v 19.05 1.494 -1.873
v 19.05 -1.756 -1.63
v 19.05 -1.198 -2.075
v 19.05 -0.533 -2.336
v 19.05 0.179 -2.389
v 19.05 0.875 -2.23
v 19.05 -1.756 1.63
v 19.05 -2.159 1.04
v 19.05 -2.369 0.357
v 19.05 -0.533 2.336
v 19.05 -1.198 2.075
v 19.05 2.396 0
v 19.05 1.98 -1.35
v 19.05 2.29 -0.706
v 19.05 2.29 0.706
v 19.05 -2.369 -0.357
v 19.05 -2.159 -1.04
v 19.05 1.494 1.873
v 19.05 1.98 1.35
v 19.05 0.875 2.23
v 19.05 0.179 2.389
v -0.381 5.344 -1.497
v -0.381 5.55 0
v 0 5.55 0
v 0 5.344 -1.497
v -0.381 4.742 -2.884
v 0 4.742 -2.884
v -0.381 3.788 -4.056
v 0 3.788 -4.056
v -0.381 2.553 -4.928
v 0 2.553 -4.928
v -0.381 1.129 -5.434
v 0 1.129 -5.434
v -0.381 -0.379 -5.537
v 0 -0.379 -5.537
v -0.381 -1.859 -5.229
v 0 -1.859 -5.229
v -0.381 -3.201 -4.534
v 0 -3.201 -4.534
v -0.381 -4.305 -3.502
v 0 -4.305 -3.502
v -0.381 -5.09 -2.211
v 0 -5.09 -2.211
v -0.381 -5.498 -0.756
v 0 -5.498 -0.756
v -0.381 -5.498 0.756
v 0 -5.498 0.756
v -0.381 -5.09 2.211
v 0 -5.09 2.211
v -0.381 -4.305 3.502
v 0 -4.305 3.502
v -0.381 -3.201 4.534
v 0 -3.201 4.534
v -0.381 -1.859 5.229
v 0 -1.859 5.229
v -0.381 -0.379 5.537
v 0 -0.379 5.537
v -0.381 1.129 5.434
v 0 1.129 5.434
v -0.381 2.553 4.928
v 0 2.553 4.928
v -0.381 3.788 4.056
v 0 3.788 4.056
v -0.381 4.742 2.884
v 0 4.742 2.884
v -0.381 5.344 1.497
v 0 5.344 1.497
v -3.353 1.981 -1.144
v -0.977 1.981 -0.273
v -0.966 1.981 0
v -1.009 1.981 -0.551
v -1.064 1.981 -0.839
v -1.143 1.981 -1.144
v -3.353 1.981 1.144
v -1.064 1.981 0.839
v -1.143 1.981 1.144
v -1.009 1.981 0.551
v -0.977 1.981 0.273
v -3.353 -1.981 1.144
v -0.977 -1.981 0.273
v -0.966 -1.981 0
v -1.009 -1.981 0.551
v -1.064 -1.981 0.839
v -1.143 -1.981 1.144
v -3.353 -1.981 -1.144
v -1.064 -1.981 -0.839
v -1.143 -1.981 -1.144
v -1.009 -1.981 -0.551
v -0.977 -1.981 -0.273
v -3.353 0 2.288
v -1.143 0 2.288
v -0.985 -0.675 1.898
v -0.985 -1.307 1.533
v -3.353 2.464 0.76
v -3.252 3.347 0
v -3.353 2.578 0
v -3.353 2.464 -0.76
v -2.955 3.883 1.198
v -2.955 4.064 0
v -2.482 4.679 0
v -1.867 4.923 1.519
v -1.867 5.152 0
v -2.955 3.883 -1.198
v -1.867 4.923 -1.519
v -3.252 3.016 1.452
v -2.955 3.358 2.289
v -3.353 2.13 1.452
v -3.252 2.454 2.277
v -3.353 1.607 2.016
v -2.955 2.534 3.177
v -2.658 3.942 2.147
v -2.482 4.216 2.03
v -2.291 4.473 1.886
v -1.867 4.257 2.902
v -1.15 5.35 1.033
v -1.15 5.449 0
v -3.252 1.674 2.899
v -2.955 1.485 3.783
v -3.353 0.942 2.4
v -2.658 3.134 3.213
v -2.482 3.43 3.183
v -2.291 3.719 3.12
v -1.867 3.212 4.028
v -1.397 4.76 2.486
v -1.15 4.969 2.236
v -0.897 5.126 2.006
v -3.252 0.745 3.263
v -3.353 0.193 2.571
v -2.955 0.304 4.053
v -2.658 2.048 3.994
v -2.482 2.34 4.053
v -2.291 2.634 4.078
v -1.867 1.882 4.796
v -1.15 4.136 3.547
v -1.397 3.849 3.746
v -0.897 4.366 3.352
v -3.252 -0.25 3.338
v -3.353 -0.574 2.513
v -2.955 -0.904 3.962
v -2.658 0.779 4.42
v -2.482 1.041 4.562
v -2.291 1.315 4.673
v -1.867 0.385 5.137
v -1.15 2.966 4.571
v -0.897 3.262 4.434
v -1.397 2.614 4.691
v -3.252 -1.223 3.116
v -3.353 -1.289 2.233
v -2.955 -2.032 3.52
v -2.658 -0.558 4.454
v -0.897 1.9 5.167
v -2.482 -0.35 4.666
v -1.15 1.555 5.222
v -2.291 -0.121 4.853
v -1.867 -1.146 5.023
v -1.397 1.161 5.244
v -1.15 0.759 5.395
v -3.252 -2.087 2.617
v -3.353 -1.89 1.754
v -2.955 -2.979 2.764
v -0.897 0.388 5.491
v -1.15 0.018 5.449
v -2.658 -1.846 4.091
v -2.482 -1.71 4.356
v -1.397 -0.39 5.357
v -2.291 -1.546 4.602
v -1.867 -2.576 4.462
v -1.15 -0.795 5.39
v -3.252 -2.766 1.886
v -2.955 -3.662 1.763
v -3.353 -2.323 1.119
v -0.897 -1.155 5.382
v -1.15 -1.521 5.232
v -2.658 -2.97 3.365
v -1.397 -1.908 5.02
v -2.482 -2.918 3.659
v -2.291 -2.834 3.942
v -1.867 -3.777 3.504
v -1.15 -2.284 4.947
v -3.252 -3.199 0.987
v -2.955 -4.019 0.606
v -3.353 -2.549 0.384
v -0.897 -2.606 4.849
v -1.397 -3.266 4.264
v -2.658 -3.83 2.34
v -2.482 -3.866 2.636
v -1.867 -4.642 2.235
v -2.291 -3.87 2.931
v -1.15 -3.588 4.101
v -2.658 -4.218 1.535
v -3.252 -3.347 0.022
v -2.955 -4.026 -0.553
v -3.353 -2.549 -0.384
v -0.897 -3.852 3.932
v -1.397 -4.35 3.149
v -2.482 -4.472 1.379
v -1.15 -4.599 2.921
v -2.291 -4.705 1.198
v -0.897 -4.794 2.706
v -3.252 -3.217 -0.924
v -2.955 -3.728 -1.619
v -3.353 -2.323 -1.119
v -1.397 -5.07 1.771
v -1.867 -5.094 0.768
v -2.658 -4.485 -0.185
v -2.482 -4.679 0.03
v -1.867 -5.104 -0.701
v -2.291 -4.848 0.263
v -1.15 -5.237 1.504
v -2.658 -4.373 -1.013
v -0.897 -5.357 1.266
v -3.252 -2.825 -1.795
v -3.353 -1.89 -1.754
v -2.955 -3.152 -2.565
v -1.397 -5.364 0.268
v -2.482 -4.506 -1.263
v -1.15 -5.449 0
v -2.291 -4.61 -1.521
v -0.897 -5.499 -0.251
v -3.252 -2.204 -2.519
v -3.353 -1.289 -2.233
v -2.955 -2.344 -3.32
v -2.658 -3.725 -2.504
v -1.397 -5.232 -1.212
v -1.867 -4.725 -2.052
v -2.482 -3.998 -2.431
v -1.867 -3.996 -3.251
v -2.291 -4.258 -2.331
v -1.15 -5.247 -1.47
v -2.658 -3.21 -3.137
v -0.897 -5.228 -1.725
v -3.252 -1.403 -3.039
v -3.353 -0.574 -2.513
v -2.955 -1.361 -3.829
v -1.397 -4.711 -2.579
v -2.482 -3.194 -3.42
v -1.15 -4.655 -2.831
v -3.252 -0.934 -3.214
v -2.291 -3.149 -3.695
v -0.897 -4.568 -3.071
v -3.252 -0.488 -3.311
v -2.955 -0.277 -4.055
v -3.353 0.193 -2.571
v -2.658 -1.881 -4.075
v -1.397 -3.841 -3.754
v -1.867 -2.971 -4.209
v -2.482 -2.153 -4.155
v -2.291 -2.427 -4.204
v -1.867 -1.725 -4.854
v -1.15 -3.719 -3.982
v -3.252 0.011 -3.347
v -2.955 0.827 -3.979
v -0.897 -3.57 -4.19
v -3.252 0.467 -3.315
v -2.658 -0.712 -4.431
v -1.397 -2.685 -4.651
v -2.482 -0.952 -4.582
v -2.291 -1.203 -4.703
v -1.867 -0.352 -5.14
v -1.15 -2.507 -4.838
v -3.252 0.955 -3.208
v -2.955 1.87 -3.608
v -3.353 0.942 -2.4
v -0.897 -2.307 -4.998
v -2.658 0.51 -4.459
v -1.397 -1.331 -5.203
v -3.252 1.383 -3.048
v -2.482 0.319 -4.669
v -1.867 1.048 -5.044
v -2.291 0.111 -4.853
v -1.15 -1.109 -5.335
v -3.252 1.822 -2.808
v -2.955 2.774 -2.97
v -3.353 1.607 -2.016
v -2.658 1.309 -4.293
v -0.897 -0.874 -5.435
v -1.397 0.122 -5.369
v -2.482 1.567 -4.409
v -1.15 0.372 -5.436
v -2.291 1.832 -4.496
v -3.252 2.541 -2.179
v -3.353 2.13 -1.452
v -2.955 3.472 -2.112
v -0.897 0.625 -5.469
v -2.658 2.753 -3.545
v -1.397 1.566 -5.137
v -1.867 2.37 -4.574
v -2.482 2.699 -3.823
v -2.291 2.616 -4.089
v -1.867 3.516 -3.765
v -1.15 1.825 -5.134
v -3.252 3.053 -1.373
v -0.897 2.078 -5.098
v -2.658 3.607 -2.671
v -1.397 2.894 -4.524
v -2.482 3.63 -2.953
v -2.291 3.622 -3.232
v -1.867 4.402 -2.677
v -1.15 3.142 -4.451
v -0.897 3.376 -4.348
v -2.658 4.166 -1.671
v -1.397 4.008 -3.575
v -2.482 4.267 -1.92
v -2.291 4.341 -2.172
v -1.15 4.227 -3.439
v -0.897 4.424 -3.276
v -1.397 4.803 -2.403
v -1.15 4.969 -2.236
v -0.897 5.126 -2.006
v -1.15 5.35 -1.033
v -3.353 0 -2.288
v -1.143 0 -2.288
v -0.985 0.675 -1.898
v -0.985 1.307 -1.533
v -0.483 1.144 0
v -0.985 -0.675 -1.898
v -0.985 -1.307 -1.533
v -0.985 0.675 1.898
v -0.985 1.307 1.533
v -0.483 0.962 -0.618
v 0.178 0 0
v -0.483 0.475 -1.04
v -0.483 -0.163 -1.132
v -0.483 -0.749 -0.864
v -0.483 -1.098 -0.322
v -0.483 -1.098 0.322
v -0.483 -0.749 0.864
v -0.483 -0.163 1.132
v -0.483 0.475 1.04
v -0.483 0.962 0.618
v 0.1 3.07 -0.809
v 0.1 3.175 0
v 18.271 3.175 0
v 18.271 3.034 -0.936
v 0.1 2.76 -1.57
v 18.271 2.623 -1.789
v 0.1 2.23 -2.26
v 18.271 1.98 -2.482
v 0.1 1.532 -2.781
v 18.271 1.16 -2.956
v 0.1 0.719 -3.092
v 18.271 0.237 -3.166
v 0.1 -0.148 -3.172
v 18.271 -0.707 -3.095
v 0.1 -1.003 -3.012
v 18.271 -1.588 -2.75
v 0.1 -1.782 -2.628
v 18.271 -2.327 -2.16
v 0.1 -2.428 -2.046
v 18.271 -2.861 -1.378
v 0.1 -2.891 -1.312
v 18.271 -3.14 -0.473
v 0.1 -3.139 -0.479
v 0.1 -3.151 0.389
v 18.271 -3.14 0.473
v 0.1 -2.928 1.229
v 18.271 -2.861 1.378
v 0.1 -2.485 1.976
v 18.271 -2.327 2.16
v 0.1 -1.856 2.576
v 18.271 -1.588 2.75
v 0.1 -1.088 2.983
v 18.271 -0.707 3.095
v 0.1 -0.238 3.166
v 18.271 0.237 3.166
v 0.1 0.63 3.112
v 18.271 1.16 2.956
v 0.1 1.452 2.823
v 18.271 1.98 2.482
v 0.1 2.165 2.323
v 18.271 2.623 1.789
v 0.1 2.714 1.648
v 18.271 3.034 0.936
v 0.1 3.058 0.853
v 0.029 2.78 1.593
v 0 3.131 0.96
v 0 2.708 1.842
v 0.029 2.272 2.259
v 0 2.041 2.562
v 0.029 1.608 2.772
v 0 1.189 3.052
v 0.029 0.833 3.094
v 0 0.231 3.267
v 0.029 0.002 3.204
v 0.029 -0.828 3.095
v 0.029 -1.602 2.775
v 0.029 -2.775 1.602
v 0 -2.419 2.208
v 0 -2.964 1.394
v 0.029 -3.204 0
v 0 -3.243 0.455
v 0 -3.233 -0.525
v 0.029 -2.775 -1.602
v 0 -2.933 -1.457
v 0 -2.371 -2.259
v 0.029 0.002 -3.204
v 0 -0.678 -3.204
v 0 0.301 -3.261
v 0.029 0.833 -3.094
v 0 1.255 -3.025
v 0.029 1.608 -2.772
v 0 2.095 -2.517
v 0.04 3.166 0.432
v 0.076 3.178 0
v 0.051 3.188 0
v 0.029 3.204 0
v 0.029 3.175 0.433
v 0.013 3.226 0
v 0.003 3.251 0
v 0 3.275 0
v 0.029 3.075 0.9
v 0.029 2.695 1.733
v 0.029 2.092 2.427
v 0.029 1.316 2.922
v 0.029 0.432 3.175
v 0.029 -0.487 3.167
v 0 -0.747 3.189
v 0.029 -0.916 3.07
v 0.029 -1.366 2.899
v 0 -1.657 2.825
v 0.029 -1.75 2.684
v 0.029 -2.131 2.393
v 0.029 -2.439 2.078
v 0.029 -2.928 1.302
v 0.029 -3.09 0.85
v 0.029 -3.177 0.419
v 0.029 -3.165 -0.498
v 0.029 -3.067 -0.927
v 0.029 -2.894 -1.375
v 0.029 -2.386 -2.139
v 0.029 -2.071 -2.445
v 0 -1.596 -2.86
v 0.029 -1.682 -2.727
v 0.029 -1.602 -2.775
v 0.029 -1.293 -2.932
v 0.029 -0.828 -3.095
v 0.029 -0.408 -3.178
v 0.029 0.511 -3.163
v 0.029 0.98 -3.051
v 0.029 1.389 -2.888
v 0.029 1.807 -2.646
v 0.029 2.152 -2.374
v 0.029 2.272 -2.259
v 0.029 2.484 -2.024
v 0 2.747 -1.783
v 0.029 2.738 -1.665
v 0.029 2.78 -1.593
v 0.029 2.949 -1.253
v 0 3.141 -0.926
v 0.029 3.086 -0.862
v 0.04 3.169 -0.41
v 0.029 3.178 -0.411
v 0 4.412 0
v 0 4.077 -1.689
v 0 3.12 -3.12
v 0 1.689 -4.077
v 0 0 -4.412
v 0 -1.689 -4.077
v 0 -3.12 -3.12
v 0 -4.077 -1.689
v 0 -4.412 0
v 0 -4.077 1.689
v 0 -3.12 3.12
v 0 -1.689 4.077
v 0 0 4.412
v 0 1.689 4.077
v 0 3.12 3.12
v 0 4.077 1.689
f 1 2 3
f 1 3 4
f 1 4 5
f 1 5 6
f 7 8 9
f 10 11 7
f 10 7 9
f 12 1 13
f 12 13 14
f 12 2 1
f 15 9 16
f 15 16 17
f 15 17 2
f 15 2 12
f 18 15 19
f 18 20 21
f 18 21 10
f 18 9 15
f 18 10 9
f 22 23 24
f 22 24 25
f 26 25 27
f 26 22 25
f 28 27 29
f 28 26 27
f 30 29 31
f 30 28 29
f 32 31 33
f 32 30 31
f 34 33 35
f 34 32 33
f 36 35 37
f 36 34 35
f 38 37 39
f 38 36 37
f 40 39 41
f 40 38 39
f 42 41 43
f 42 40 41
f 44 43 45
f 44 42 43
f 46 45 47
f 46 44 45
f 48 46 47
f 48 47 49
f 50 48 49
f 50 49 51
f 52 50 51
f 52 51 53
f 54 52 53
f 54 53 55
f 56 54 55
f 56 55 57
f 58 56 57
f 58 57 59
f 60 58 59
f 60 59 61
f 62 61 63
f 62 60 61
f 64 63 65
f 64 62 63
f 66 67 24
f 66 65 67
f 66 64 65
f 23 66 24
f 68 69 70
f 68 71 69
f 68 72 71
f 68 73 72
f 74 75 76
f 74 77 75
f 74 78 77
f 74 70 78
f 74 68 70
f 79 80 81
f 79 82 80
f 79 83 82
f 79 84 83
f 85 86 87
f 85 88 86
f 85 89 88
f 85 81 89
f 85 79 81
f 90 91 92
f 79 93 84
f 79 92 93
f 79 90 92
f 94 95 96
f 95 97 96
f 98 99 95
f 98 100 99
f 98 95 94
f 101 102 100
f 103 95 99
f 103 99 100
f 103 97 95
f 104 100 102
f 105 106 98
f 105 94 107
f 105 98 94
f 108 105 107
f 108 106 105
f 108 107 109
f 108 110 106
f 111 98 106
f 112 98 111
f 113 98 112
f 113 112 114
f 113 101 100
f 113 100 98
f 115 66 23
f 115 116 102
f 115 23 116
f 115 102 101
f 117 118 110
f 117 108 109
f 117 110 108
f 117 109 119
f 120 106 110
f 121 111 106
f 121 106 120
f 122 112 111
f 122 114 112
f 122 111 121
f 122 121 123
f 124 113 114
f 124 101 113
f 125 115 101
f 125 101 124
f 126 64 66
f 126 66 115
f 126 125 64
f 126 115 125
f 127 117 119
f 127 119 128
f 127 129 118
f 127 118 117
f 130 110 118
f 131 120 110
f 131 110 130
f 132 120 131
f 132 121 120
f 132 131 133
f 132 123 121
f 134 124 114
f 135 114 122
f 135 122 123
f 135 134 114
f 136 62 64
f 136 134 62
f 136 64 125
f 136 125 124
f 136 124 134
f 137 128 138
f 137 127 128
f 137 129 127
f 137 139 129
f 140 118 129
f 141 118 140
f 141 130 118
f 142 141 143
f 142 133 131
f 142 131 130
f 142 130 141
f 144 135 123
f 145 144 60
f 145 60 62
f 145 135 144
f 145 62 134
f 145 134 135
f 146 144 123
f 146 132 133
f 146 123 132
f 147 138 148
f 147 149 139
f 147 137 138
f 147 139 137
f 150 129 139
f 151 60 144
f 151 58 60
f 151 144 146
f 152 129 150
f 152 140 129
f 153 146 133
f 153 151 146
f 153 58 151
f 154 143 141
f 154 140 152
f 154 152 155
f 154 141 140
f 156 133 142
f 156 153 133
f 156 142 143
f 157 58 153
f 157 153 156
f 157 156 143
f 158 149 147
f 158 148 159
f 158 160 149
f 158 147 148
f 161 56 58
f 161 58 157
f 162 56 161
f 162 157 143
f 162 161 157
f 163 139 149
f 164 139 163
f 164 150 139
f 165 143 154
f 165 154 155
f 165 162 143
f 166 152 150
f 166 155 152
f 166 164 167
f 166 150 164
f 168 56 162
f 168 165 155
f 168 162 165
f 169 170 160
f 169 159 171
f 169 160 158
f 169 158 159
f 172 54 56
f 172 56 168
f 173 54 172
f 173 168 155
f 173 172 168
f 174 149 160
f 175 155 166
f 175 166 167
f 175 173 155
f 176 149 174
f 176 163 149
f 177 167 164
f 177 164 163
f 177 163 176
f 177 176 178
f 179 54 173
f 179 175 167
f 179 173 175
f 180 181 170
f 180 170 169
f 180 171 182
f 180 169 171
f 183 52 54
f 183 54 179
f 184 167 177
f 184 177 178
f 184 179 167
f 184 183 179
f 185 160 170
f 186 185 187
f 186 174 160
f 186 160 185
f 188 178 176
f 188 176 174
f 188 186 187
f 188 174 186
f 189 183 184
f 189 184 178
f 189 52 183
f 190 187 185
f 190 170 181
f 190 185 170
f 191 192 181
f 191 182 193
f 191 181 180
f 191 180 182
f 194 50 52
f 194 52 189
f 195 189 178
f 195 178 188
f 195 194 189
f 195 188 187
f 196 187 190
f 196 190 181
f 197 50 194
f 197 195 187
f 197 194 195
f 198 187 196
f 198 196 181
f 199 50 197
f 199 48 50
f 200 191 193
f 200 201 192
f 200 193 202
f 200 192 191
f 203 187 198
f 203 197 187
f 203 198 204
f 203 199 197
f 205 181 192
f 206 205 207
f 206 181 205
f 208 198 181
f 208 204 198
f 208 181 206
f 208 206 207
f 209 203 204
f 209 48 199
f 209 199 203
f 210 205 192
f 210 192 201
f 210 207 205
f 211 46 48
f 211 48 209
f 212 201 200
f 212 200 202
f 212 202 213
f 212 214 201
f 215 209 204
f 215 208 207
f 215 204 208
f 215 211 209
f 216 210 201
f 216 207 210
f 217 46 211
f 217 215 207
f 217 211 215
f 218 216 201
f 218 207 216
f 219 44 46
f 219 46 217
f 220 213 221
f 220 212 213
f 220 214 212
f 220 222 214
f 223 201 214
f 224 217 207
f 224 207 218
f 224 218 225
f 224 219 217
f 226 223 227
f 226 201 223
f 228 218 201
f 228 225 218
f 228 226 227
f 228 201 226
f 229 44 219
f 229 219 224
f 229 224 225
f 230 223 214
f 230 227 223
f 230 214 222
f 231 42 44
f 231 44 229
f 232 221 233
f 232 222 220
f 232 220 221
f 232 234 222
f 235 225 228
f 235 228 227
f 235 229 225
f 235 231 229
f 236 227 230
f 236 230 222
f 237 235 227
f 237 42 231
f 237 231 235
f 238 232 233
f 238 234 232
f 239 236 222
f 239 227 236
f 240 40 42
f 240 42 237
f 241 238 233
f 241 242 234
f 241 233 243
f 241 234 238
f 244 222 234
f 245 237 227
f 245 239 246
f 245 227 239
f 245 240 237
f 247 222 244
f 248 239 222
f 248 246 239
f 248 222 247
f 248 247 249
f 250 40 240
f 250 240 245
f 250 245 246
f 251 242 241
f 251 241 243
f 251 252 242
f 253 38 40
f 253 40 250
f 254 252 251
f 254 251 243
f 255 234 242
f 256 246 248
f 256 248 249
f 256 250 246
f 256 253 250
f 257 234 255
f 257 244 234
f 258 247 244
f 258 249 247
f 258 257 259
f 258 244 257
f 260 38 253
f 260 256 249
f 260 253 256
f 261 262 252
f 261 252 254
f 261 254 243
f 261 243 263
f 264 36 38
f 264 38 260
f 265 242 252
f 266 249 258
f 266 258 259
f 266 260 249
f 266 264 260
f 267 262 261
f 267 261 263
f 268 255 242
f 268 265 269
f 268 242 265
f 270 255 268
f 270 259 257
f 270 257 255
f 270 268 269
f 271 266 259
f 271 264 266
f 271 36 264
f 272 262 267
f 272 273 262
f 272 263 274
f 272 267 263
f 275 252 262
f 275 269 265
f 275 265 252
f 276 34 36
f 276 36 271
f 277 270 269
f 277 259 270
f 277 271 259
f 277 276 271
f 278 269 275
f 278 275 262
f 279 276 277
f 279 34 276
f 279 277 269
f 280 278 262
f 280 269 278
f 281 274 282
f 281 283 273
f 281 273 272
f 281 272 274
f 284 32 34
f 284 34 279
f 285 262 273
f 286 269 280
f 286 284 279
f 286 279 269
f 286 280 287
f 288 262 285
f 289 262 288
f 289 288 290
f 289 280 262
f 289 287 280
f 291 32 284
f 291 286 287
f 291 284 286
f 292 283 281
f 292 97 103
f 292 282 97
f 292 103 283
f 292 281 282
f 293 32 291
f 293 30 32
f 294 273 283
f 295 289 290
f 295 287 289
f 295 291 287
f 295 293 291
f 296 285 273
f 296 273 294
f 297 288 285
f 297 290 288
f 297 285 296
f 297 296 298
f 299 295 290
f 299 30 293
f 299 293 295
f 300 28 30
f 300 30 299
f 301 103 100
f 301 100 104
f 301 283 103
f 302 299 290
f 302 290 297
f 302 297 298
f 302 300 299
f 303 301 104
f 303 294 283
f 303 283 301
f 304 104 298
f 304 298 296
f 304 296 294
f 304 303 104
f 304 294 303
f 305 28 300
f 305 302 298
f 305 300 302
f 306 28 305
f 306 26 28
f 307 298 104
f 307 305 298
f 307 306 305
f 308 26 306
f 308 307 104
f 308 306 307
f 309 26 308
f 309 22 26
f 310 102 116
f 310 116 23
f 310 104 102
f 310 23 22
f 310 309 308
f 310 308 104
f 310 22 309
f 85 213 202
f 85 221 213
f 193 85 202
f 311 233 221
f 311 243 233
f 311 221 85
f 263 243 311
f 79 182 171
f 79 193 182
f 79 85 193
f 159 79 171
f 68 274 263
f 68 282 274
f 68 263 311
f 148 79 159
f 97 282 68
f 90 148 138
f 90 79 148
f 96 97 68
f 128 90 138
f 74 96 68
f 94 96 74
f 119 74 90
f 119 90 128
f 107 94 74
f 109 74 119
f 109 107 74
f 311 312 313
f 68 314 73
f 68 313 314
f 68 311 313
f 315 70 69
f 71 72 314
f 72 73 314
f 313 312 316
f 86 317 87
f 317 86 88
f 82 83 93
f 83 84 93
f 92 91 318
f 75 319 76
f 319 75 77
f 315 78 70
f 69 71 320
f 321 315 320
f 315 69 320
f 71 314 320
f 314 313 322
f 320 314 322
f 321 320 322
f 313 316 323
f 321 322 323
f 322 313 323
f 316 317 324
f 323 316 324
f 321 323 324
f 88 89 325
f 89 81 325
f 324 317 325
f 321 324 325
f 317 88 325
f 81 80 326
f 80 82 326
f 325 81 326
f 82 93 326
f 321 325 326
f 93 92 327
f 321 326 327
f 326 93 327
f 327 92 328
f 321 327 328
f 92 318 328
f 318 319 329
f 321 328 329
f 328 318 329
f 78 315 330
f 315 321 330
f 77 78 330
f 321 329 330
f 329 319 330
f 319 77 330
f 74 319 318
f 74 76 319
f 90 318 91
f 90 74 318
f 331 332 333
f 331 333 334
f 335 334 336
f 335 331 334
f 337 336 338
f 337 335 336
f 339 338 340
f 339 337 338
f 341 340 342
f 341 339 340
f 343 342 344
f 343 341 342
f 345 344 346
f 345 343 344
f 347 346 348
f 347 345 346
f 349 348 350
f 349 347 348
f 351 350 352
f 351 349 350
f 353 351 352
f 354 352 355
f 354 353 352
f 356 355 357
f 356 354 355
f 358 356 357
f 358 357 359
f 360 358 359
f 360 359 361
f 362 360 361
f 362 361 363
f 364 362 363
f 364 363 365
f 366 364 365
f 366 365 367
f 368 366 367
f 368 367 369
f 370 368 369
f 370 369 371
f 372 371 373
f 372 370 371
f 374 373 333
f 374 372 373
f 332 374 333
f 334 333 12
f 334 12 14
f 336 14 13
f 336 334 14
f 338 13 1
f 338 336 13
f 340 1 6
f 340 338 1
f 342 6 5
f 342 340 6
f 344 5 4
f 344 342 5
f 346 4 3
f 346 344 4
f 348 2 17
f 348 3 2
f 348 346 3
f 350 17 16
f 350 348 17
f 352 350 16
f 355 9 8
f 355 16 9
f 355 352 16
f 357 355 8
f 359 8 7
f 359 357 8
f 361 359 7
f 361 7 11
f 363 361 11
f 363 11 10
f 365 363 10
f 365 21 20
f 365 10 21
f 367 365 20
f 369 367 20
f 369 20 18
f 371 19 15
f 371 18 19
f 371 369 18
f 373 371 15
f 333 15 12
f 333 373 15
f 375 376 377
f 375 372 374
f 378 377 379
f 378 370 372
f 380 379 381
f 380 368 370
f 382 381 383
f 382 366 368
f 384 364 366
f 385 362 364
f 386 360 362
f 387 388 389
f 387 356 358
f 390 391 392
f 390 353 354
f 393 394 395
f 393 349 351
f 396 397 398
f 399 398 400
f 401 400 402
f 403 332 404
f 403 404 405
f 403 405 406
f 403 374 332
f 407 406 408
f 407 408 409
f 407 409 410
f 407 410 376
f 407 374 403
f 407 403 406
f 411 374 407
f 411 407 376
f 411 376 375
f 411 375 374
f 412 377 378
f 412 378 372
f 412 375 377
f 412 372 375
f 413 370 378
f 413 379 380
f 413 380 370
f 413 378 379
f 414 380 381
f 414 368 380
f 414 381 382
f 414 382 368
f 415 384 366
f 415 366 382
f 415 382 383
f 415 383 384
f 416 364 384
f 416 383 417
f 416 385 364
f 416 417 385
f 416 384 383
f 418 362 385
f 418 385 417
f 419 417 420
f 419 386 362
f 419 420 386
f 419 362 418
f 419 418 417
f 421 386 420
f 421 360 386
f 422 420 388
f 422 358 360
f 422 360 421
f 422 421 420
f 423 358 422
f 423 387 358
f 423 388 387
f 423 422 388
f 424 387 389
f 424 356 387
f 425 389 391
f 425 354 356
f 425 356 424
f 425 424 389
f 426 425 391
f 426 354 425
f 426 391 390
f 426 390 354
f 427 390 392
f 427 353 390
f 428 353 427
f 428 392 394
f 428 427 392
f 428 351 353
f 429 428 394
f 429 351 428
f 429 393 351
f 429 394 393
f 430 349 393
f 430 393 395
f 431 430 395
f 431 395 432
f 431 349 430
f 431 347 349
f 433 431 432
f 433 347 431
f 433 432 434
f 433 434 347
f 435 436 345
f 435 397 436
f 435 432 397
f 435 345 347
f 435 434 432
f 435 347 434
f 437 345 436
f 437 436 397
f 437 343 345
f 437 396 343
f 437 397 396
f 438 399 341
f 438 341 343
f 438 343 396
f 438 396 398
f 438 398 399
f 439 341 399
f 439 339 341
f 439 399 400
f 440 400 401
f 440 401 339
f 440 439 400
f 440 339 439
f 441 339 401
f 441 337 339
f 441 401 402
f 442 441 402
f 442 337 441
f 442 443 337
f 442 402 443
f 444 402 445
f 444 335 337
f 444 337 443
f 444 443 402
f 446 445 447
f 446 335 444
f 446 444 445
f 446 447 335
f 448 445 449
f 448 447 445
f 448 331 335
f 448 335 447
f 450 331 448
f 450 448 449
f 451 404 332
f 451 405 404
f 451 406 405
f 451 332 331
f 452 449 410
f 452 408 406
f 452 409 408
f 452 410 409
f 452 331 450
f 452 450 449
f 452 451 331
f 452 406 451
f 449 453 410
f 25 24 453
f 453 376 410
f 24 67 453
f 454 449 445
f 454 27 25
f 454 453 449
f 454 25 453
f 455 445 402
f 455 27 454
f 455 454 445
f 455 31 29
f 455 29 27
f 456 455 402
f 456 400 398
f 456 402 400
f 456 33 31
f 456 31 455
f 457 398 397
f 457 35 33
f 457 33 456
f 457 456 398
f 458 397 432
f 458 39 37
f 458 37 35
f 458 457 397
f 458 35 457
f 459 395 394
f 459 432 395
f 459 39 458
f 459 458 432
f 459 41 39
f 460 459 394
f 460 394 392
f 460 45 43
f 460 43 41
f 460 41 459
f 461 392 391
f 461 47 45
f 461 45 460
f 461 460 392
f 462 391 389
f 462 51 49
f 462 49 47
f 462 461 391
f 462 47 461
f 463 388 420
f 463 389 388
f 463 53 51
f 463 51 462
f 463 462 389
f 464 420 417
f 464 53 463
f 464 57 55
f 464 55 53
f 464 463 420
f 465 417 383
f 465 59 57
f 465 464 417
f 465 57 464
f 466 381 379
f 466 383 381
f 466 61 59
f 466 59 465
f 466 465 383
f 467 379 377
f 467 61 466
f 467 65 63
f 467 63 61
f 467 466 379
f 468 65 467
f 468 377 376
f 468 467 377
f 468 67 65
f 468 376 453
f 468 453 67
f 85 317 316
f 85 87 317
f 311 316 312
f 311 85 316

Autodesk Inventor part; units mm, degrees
ref_plane "YZ Plane" through (0, 0, 0) normal (1, 0, 0) x (0, 1, 0)
ref_plane "XZ Plane" through (0, 0, 0) normal (0, 1, 0) x (-1, 0, 0)
sketch "Sketch1" plane through (0, 0, 0) normal (0, 0, 1) x (1, 0, 0)
  line L0 (0.1778, 0) -> (19.05, 0)
  line L1 (19.05, 0) -> (19.05, 3.175)
  line L2 (19.05, 3.175) -> (2.5402, 3.175)
  line L3 (2.5402, 3.175) -> (0.0001, 3.175)
  line L4 (0.0001, 3.175) -> (0, 3.175)
  line L5 (0, 3.175) -> (0, 5.5499)
  line L6 (0, 5.5499) -> (-3.3528, 5.5499)
  line L7 (-3.3528, 5.5499) -> (-3.3528, 2.2877)
  line L8 (-3.3528, 2.2877) -> (-1.143, 2.2877)
  line L9 (-1.143, 2.2877) -> (0.1778, 0)
  line L10 (-7.8334, 0) -> (23.5306, 0) projected
  line L11 (0, -1.11) -> (0, 6.6599) projected
  line L12 (2.5402, 3.175) -> (0, 3.175) construction
  dimension "d1" = 16.5098
  dimension "d2" = 2.5401
  dimension "d3" = 3.3528
  dimension "d4" = 2.2098
  dimension "d5" = 60
  dimension "d6" = 6.35
  dimension "d7" = 6.35
  dimension "d8" = 4.5754
  dimension "d9" = 11.0998
  dimension "d26" = 19.05
revolve "Body" add sketch "Sketch1" angle 360 about axis through (0.1778, 0, 0) along (1, 0, 0) contours L9 L11 L3 L2 L1 L0 | L9 L8 L7 L6 L5 L11
sketch "Sketch2" plane through (-3.3528, 0, 0) normal (-1, 0, 0) x (0, 0, 1)
  circle A0 centre (0, 0) radius 2.2877 projected
  line L0 (0, -7.7699) -> (0, 7.7699) projected
  line L1 (-7.7699, 0) -> (7.7699, 0) projected
  line L2 (2.2877, 0) -> (1.1438, -1.9812)
  line L3 (1.1438, -1.9812) -> (-1.1438, -1.9812)
  line L4 (-1.1438, -1.9812) -> (-2.2877, 0)
  line L5 (-2.2877, 0) -> (-1.1438, 1.9812)
  line L6 (-1.1438, 1.9812) -> (1.1438, 1.9812)
  line L7 (1.1438, 1.9812) -> (2.2877, 0)
extrude "Slot" add sketch "Sketch2" against normal up to next contours L7 A0 | A0 L2 | L6 L0 A0 | A0 L0 L3 | L0 L6 A0 | A0 L3 L0 | L4 A0 | A0 L5
fillet "Fillet1" radius 2.9718 1 edges at (-3.3528, -5.5499, 0)
thread "Thread" size "1/4-20 UNC" class "2A" standard "ANSI Unified Screw Threads" length 16.5098
chamfer "Chamfer1" distance 0.779 distance2 0.779 1 edges at (19.05, -3.175, 0) measured on face at (19.05, 0.0983, -0.8099)
ref_plane "Work Plane1" through (29, 0, 0) normal (0, -1, 0) x (1, 0, 0)
fillet "Fillet2" radius 0.1 1 edges at (0.0001, -3.175, 0)
equation "\"d30\" = R"
equation "\"d17\" = RR"
equation "\"d13\" = GEL"
equation "\"d15\" = -0.5 * SPD + 0.5 * GD"
equation "\"d16\" = GUL"
equation "\"d1\" = GEL"
equation "\"d3\" = KOH"
equation "\"d4\" = INTI"
equation "\"d6\" = GD"
equation "\"d7\" = BDM"
equation "\"d8\" = 1.1547 * SW"
equation "\"d9\" = KOD"
equation "\"d26\" = NLG"
equation "\"GD\" = NND"
equation "\"NLG\" = 19.05"
equation "\"GEL\" = 16.5098"
equation "\"KOD\" = 11.0998"
equation "\"KOH\" = 3.3528"
equation "\"INTI\" = 2.2098"
equation "\"GAL\" = 2.54"
equation "\"GUL\" = 0.77902"
equation "\"BDM\" = NND"
equation "\"SW\" = 3.9624"
equation "\"RR\" = 2.9718"
equation "\"SPD\" = 4.79196"
equation "\"R\" = 0.1"
equation "\"TOA\" = 30deg"
equation "\"GD1\" = SPD"
equation "\"THREADDIA\" = 6.35"
equation "\"KOH1\" = 0.7874"
equation "\"NND\" = 6.35"
equation "\"E0\" = 4.57657"
properties part number "ANSI B18.3 - 1/4 - 20 x 3/4" material "Steel, Mild"
